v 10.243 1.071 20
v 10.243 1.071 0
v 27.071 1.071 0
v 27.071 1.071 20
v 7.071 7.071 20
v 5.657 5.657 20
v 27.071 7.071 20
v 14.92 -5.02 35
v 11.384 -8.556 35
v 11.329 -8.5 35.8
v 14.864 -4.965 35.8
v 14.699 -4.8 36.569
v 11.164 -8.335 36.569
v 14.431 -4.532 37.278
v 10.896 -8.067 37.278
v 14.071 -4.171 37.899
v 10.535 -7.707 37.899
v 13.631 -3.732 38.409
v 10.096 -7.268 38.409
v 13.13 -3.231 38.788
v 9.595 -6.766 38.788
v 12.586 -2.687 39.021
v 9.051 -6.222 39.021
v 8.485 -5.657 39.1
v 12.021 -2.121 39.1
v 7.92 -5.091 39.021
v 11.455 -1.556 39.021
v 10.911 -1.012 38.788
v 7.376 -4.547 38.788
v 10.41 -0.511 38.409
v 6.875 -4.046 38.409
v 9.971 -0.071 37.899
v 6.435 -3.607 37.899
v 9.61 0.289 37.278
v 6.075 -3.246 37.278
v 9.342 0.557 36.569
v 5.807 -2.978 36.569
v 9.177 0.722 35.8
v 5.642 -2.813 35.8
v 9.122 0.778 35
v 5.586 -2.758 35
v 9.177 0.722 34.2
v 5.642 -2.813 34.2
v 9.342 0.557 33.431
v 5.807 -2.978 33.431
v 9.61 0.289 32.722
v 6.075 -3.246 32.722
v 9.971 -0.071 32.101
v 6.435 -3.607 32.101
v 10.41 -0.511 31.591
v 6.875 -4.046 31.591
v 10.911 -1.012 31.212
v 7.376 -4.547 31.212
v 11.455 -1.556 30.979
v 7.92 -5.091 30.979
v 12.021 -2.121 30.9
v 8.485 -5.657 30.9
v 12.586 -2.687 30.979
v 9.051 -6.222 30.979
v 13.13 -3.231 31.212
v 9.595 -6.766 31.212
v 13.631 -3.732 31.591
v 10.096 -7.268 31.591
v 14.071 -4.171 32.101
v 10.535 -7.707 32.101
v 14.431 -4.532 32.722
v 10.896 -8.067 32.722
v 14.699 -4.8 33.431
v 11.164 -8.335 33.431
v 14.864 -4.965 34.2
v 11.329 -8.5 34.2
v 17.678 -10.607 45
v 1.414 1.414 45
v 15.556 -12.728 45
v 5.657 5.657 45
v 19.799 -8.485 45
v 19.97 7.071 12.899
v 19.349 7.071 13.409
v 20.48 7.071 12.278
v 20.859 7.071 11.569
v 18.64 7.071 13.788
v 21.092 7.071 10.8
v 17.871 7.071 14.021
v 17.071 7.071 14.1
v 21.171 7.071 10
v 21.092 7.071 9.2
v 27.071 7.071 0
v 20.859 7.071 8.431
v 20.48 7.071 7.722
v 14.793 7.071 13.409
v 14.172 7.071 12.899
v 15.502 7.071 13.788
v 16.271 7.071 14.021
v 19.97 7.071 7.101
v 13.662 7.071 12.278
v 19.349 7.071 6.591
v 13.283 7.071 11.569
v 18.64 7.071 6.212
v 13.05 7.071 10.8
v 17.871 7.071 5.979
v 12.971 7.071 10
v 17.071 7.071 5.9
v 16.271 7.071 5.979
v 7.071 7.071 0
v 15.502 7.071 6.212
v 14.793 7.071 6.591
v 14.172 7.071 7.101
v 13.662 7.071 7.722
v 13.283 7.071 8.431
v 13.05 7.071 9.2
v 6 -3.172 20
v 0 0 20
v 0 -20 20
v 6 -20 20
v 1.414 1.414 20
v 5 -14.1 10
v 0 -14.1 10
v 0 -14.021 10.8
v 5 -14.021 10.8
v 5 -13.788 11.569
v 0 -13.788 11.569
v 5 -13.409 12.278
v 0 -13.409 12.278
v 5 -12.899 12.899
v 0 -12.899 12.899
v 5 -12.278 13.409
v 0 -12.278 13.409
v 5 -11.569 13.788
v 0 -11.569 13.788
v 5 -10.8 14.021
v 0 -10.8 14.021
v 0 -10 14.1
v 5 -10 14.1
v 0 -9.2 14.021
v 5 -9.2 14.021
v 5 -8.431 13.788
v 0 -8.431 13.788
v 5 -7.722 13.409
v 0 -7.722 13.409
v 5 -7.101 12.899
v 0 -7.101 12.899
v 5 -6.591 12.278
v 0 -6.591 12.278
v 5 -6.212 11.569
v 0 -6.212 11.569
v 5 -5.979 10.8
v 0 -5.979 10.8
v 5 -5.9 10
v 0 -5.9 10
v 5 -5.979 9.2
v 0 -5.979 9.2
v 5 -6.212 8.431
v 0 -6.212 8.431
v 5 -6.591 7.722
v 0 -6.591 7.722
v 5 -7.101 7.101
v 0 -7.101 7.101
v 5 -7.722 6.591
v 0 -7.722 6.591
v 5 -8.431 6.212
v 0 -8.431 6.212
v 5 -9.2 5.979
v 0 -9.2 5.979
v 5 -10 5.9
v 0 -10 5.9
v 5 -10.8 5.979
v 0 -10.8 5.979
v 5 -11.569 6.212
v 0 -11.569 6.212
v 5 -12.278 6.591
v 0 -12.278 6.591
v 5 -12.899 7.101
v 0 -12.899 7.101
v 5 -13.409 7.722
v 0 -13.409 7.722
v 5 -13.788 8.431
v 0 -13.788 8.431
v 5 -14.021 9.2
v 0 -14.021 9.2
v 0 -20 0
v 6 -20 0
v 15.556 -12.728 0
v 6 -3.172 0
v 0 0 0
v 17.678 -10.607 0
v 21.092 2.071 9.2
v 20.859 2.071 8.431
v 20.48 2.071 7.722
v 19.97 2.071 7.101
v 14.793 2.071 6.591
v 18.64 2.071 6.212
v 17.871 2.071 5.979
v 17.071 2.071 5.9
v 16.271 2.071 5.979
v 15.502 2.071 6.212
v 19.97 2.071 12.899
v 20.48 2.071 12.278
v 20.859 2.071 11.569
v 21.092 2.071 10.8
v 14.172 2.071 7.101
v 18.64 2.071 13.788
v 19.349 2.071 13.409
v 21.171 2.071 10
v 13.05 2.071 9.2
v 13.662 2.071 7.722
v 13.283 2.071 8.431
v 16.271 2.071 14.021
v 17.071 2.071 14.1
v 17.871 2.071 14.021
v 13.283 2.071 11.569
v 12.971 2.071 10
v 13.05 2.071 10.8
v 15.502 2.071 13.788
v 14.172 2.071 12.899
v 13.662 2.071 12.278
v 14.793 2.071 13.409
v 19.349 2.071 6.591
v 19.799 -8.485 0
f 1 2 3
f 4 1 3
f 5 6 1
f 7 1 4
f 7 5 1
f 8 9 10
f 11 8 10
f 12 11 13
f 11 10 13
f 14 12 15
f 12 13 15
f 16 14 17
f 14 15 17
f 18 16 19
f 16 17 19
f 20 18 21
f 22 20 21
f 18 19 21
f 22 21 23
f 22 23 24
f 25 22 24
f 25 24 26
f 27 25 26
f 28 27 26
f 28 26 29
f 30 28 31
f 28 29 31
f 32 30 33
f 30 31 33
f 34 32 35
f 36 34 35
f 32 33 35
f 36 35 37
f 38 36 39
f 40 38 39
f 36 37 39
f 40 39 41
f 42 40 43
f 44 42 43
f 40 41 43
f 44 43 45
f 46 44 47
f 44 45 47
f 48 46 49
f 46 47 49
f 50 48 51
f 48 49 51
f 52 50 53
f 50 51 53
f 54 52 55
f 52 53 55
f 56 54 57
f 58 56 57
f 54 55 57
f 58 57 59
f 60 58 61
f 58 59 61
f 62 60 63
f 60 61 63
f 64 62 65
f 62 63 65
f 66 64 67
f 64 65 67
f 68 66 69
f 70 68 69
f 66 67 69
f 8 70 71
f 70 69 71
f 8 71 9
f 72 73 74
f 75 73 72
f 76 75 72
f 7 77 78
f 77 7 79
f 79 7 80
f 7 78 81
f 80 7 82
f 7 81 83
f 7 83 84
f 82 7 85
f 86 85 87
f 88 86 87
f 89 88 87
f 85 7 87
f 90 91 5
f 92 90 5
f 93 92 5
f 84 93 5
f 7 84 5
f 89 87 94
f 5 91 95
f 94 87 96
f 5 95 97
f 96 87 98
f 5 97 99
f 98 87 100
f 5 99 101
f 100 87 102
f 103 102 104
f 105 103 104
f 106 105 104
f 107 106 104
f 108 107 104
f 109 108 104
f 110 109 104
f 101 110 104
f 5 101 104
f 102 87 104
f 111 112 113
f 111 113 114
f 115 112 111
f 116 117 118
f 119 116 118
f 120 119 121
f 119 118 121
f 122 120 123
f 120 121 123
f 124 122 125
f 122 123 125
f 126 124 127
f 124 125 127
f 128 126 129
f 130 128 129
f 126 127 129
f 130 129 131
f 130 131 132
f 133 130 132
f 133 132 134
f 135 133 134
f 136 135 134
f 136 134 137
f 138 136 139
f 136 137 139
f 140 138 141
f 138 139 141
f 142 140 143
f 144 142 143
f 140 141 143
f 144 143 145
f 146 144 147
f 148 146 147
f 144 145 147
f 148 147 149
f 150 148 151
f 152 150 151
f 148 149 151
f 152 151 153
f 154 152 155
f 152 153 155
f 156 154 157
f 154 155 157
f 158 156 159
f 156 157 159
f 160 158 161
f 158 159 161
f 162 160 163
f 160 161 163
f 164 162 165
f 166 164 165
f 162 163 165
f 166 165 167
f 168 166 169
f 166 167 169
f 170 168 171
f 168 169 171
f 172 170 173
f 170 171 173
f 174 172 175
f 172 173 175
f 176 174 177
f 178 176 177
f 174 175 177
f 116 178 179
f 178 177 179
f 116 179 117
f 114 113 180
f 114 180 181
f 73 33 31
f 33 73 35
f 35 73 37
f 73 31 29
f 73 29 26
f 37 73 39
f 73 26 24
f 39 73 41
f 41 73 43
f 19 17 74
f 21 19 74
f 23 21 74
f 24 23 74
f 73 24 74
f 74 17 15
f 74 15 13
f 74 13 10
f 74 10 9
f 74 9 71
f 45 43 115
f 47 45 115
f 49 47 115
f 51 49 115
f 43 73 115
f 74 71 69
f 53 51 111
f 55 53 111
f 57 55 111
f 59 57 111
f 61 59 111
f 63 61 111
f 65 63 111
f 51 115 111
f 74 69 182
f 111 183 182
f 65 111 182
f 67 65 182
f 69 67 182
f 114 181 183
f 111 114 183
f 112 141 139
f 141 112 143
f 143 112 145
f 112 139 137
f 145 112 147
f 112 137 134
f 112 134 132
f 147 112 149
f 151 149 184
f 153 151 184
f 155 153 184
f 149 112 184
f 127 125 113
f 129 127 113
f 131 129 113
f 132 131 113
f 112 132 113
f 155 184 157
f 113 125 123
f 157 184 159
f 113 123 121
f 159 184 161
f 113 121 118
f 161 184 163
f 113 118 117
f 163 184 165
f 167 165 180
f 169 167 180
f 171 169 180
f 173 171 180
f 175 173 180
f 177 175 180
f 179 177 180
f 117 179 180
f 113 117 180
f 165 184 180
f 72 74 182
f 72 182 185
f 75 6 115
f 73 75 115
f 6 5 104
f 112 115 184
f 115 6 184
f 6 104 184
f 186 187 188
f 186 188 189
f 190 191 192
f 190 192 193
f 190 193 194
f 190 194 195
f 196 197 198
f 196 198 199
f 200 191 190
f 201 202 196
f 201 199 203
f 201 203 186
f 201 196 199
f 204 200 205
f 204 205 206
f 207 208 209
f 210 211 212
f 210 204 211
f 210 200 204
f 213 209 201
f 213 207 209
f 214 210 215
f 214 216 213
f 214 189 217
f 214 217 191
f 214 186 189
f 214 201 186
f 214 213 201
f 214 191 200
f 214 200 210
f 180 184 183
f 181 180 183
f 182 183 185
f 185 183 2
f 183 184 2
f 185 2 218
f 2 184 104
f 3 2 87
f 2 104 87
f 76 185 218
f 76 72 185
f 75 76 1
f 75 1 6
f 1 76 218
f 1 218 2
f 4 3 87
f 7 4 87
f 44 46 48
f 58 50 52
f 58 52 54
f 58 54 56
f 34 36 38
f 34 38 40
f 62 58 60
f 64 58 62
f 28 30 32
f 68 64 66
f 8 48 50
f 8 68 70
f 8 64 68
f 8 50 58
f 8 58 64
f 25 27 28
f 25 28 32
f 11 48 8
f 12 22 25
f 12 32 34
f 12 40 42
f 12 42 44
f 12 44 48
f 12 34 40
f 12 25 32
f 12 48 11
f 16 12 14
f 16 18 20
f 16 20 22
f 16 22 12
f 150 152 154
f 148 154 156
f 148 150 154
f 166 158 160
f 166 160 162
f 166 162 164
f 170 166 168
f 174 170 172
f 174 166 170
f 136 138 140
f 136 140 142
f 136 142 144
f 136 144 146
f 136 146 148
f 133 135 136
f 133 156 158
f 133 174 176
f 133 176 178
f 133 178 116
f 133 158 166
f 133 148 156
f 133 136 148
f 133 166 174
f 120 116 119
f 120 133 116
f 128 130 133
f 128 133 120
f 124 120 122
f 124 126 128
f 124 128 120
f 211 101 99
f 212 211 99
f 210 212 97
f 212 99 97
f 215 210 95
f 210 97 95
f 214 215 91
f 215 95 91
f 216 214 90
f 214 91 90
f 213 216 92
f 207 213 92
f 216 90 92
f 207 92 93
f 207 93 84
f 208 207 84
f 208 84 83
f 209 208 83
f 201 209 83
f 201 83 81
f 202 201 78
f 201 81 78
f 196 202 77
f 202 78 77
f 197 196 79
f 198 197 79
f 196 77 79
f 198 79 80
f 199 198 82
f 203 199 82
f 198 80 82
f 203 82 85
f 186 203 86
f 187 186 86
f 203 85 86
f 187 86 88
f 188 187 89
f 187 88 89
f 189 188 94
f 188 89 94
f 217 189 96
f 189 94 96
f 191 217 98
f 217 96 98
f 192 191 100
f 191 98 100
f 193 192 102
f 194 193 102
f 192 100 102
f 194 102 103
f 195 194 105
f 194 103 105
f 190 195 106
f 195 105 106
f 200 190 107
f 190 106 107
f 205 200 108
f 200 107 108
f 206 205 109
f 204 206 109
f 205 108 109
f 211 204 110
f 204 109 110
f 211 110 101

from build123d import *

# Parameters (mm, degrees)
F1_DEPTH      = 20
F3_DEPTH      = 25
F3_DEPTH_BACK = 20
F4_R          = 4.1
F5_DEPTH      = 5
F6_R          = 4.1
F7_DEPTH      = 5
F8_R          = 4.1
F9_DEPTH      = 5


with BuildPart() as f1:
    # F0 (on Top) → F1 (new body)
    with BuildSketch(Plane.XY):
        Polygon((7.0710678119, 7.0710678119), (0, 0), (0, -20), (6, -20), (6, -2.4852813742), (9.5563491861, 1.0710678119), (27.0710678119, 1.0710678119), (27.0710678119, 7.0710678119), align=None)
    extrude(amount=F1_DEPTH)

    # F2 (on face) → F3 (join, two sides)
    with BuildSketch(Plane.XY.offset(20)) as f3_sk:
        Polygon((5.6568542495, 5.6568542495), (3.5355339059, 3.5355339059), (17.6776695297, -10.6066017178), (19.7989898732, -8.4852813742), align=None)
        Polygon((17.6776695297, -10.6066017178), (3.5355339059, 3.5355339059), (1.4142135624, 1.4142135624), (15.5563491861, -12.7279220614), align=None)
    extrude(amount=F3_DEPTH)
    extrude(f3_sk.sketch, amount=-F3_DEPTH_BACK)

    # F4 (on face) → F5 (cut)
    with BuildSketch(Plane(origin=(0, 0, 0), x_dir=(0, -1, 0), z_dir=(-1, 0, 0))):
        with Locations((10, 10)):
            Circle(F4_R)
    extrude(amount=-F5_DEPTH, mode=Mode.SUBTRACT)

    # F6 (on face) → F7 (cut)
    with BuildSketch(Plane(origin=(0, 7.0710678119, 0), x_dir=(-1, 0, 0), z_dir=(0, 1, 0))):
        with Locations((-17.0710678119, 10)):
            Circle(F6_R)
    extrude(amount=-F7_DEPTH, mode=Mode.SUBTRACT)

    # F8 (on face) → F9 (cut)
    with BuildSketch(Plane(origin=(1.4142135624, 1.4142135624, 0), x_dir=(0.7071067812, -0.7071067812, 0), z_dir=(-0.7071067812, -0.7071067812, 0))):
        with Locations((10, 35)):
            Circle(F8_R)
    extrude(amount=-F9_DEPTH, mode=Mode.SUBTRACT)


solid = f1.part
